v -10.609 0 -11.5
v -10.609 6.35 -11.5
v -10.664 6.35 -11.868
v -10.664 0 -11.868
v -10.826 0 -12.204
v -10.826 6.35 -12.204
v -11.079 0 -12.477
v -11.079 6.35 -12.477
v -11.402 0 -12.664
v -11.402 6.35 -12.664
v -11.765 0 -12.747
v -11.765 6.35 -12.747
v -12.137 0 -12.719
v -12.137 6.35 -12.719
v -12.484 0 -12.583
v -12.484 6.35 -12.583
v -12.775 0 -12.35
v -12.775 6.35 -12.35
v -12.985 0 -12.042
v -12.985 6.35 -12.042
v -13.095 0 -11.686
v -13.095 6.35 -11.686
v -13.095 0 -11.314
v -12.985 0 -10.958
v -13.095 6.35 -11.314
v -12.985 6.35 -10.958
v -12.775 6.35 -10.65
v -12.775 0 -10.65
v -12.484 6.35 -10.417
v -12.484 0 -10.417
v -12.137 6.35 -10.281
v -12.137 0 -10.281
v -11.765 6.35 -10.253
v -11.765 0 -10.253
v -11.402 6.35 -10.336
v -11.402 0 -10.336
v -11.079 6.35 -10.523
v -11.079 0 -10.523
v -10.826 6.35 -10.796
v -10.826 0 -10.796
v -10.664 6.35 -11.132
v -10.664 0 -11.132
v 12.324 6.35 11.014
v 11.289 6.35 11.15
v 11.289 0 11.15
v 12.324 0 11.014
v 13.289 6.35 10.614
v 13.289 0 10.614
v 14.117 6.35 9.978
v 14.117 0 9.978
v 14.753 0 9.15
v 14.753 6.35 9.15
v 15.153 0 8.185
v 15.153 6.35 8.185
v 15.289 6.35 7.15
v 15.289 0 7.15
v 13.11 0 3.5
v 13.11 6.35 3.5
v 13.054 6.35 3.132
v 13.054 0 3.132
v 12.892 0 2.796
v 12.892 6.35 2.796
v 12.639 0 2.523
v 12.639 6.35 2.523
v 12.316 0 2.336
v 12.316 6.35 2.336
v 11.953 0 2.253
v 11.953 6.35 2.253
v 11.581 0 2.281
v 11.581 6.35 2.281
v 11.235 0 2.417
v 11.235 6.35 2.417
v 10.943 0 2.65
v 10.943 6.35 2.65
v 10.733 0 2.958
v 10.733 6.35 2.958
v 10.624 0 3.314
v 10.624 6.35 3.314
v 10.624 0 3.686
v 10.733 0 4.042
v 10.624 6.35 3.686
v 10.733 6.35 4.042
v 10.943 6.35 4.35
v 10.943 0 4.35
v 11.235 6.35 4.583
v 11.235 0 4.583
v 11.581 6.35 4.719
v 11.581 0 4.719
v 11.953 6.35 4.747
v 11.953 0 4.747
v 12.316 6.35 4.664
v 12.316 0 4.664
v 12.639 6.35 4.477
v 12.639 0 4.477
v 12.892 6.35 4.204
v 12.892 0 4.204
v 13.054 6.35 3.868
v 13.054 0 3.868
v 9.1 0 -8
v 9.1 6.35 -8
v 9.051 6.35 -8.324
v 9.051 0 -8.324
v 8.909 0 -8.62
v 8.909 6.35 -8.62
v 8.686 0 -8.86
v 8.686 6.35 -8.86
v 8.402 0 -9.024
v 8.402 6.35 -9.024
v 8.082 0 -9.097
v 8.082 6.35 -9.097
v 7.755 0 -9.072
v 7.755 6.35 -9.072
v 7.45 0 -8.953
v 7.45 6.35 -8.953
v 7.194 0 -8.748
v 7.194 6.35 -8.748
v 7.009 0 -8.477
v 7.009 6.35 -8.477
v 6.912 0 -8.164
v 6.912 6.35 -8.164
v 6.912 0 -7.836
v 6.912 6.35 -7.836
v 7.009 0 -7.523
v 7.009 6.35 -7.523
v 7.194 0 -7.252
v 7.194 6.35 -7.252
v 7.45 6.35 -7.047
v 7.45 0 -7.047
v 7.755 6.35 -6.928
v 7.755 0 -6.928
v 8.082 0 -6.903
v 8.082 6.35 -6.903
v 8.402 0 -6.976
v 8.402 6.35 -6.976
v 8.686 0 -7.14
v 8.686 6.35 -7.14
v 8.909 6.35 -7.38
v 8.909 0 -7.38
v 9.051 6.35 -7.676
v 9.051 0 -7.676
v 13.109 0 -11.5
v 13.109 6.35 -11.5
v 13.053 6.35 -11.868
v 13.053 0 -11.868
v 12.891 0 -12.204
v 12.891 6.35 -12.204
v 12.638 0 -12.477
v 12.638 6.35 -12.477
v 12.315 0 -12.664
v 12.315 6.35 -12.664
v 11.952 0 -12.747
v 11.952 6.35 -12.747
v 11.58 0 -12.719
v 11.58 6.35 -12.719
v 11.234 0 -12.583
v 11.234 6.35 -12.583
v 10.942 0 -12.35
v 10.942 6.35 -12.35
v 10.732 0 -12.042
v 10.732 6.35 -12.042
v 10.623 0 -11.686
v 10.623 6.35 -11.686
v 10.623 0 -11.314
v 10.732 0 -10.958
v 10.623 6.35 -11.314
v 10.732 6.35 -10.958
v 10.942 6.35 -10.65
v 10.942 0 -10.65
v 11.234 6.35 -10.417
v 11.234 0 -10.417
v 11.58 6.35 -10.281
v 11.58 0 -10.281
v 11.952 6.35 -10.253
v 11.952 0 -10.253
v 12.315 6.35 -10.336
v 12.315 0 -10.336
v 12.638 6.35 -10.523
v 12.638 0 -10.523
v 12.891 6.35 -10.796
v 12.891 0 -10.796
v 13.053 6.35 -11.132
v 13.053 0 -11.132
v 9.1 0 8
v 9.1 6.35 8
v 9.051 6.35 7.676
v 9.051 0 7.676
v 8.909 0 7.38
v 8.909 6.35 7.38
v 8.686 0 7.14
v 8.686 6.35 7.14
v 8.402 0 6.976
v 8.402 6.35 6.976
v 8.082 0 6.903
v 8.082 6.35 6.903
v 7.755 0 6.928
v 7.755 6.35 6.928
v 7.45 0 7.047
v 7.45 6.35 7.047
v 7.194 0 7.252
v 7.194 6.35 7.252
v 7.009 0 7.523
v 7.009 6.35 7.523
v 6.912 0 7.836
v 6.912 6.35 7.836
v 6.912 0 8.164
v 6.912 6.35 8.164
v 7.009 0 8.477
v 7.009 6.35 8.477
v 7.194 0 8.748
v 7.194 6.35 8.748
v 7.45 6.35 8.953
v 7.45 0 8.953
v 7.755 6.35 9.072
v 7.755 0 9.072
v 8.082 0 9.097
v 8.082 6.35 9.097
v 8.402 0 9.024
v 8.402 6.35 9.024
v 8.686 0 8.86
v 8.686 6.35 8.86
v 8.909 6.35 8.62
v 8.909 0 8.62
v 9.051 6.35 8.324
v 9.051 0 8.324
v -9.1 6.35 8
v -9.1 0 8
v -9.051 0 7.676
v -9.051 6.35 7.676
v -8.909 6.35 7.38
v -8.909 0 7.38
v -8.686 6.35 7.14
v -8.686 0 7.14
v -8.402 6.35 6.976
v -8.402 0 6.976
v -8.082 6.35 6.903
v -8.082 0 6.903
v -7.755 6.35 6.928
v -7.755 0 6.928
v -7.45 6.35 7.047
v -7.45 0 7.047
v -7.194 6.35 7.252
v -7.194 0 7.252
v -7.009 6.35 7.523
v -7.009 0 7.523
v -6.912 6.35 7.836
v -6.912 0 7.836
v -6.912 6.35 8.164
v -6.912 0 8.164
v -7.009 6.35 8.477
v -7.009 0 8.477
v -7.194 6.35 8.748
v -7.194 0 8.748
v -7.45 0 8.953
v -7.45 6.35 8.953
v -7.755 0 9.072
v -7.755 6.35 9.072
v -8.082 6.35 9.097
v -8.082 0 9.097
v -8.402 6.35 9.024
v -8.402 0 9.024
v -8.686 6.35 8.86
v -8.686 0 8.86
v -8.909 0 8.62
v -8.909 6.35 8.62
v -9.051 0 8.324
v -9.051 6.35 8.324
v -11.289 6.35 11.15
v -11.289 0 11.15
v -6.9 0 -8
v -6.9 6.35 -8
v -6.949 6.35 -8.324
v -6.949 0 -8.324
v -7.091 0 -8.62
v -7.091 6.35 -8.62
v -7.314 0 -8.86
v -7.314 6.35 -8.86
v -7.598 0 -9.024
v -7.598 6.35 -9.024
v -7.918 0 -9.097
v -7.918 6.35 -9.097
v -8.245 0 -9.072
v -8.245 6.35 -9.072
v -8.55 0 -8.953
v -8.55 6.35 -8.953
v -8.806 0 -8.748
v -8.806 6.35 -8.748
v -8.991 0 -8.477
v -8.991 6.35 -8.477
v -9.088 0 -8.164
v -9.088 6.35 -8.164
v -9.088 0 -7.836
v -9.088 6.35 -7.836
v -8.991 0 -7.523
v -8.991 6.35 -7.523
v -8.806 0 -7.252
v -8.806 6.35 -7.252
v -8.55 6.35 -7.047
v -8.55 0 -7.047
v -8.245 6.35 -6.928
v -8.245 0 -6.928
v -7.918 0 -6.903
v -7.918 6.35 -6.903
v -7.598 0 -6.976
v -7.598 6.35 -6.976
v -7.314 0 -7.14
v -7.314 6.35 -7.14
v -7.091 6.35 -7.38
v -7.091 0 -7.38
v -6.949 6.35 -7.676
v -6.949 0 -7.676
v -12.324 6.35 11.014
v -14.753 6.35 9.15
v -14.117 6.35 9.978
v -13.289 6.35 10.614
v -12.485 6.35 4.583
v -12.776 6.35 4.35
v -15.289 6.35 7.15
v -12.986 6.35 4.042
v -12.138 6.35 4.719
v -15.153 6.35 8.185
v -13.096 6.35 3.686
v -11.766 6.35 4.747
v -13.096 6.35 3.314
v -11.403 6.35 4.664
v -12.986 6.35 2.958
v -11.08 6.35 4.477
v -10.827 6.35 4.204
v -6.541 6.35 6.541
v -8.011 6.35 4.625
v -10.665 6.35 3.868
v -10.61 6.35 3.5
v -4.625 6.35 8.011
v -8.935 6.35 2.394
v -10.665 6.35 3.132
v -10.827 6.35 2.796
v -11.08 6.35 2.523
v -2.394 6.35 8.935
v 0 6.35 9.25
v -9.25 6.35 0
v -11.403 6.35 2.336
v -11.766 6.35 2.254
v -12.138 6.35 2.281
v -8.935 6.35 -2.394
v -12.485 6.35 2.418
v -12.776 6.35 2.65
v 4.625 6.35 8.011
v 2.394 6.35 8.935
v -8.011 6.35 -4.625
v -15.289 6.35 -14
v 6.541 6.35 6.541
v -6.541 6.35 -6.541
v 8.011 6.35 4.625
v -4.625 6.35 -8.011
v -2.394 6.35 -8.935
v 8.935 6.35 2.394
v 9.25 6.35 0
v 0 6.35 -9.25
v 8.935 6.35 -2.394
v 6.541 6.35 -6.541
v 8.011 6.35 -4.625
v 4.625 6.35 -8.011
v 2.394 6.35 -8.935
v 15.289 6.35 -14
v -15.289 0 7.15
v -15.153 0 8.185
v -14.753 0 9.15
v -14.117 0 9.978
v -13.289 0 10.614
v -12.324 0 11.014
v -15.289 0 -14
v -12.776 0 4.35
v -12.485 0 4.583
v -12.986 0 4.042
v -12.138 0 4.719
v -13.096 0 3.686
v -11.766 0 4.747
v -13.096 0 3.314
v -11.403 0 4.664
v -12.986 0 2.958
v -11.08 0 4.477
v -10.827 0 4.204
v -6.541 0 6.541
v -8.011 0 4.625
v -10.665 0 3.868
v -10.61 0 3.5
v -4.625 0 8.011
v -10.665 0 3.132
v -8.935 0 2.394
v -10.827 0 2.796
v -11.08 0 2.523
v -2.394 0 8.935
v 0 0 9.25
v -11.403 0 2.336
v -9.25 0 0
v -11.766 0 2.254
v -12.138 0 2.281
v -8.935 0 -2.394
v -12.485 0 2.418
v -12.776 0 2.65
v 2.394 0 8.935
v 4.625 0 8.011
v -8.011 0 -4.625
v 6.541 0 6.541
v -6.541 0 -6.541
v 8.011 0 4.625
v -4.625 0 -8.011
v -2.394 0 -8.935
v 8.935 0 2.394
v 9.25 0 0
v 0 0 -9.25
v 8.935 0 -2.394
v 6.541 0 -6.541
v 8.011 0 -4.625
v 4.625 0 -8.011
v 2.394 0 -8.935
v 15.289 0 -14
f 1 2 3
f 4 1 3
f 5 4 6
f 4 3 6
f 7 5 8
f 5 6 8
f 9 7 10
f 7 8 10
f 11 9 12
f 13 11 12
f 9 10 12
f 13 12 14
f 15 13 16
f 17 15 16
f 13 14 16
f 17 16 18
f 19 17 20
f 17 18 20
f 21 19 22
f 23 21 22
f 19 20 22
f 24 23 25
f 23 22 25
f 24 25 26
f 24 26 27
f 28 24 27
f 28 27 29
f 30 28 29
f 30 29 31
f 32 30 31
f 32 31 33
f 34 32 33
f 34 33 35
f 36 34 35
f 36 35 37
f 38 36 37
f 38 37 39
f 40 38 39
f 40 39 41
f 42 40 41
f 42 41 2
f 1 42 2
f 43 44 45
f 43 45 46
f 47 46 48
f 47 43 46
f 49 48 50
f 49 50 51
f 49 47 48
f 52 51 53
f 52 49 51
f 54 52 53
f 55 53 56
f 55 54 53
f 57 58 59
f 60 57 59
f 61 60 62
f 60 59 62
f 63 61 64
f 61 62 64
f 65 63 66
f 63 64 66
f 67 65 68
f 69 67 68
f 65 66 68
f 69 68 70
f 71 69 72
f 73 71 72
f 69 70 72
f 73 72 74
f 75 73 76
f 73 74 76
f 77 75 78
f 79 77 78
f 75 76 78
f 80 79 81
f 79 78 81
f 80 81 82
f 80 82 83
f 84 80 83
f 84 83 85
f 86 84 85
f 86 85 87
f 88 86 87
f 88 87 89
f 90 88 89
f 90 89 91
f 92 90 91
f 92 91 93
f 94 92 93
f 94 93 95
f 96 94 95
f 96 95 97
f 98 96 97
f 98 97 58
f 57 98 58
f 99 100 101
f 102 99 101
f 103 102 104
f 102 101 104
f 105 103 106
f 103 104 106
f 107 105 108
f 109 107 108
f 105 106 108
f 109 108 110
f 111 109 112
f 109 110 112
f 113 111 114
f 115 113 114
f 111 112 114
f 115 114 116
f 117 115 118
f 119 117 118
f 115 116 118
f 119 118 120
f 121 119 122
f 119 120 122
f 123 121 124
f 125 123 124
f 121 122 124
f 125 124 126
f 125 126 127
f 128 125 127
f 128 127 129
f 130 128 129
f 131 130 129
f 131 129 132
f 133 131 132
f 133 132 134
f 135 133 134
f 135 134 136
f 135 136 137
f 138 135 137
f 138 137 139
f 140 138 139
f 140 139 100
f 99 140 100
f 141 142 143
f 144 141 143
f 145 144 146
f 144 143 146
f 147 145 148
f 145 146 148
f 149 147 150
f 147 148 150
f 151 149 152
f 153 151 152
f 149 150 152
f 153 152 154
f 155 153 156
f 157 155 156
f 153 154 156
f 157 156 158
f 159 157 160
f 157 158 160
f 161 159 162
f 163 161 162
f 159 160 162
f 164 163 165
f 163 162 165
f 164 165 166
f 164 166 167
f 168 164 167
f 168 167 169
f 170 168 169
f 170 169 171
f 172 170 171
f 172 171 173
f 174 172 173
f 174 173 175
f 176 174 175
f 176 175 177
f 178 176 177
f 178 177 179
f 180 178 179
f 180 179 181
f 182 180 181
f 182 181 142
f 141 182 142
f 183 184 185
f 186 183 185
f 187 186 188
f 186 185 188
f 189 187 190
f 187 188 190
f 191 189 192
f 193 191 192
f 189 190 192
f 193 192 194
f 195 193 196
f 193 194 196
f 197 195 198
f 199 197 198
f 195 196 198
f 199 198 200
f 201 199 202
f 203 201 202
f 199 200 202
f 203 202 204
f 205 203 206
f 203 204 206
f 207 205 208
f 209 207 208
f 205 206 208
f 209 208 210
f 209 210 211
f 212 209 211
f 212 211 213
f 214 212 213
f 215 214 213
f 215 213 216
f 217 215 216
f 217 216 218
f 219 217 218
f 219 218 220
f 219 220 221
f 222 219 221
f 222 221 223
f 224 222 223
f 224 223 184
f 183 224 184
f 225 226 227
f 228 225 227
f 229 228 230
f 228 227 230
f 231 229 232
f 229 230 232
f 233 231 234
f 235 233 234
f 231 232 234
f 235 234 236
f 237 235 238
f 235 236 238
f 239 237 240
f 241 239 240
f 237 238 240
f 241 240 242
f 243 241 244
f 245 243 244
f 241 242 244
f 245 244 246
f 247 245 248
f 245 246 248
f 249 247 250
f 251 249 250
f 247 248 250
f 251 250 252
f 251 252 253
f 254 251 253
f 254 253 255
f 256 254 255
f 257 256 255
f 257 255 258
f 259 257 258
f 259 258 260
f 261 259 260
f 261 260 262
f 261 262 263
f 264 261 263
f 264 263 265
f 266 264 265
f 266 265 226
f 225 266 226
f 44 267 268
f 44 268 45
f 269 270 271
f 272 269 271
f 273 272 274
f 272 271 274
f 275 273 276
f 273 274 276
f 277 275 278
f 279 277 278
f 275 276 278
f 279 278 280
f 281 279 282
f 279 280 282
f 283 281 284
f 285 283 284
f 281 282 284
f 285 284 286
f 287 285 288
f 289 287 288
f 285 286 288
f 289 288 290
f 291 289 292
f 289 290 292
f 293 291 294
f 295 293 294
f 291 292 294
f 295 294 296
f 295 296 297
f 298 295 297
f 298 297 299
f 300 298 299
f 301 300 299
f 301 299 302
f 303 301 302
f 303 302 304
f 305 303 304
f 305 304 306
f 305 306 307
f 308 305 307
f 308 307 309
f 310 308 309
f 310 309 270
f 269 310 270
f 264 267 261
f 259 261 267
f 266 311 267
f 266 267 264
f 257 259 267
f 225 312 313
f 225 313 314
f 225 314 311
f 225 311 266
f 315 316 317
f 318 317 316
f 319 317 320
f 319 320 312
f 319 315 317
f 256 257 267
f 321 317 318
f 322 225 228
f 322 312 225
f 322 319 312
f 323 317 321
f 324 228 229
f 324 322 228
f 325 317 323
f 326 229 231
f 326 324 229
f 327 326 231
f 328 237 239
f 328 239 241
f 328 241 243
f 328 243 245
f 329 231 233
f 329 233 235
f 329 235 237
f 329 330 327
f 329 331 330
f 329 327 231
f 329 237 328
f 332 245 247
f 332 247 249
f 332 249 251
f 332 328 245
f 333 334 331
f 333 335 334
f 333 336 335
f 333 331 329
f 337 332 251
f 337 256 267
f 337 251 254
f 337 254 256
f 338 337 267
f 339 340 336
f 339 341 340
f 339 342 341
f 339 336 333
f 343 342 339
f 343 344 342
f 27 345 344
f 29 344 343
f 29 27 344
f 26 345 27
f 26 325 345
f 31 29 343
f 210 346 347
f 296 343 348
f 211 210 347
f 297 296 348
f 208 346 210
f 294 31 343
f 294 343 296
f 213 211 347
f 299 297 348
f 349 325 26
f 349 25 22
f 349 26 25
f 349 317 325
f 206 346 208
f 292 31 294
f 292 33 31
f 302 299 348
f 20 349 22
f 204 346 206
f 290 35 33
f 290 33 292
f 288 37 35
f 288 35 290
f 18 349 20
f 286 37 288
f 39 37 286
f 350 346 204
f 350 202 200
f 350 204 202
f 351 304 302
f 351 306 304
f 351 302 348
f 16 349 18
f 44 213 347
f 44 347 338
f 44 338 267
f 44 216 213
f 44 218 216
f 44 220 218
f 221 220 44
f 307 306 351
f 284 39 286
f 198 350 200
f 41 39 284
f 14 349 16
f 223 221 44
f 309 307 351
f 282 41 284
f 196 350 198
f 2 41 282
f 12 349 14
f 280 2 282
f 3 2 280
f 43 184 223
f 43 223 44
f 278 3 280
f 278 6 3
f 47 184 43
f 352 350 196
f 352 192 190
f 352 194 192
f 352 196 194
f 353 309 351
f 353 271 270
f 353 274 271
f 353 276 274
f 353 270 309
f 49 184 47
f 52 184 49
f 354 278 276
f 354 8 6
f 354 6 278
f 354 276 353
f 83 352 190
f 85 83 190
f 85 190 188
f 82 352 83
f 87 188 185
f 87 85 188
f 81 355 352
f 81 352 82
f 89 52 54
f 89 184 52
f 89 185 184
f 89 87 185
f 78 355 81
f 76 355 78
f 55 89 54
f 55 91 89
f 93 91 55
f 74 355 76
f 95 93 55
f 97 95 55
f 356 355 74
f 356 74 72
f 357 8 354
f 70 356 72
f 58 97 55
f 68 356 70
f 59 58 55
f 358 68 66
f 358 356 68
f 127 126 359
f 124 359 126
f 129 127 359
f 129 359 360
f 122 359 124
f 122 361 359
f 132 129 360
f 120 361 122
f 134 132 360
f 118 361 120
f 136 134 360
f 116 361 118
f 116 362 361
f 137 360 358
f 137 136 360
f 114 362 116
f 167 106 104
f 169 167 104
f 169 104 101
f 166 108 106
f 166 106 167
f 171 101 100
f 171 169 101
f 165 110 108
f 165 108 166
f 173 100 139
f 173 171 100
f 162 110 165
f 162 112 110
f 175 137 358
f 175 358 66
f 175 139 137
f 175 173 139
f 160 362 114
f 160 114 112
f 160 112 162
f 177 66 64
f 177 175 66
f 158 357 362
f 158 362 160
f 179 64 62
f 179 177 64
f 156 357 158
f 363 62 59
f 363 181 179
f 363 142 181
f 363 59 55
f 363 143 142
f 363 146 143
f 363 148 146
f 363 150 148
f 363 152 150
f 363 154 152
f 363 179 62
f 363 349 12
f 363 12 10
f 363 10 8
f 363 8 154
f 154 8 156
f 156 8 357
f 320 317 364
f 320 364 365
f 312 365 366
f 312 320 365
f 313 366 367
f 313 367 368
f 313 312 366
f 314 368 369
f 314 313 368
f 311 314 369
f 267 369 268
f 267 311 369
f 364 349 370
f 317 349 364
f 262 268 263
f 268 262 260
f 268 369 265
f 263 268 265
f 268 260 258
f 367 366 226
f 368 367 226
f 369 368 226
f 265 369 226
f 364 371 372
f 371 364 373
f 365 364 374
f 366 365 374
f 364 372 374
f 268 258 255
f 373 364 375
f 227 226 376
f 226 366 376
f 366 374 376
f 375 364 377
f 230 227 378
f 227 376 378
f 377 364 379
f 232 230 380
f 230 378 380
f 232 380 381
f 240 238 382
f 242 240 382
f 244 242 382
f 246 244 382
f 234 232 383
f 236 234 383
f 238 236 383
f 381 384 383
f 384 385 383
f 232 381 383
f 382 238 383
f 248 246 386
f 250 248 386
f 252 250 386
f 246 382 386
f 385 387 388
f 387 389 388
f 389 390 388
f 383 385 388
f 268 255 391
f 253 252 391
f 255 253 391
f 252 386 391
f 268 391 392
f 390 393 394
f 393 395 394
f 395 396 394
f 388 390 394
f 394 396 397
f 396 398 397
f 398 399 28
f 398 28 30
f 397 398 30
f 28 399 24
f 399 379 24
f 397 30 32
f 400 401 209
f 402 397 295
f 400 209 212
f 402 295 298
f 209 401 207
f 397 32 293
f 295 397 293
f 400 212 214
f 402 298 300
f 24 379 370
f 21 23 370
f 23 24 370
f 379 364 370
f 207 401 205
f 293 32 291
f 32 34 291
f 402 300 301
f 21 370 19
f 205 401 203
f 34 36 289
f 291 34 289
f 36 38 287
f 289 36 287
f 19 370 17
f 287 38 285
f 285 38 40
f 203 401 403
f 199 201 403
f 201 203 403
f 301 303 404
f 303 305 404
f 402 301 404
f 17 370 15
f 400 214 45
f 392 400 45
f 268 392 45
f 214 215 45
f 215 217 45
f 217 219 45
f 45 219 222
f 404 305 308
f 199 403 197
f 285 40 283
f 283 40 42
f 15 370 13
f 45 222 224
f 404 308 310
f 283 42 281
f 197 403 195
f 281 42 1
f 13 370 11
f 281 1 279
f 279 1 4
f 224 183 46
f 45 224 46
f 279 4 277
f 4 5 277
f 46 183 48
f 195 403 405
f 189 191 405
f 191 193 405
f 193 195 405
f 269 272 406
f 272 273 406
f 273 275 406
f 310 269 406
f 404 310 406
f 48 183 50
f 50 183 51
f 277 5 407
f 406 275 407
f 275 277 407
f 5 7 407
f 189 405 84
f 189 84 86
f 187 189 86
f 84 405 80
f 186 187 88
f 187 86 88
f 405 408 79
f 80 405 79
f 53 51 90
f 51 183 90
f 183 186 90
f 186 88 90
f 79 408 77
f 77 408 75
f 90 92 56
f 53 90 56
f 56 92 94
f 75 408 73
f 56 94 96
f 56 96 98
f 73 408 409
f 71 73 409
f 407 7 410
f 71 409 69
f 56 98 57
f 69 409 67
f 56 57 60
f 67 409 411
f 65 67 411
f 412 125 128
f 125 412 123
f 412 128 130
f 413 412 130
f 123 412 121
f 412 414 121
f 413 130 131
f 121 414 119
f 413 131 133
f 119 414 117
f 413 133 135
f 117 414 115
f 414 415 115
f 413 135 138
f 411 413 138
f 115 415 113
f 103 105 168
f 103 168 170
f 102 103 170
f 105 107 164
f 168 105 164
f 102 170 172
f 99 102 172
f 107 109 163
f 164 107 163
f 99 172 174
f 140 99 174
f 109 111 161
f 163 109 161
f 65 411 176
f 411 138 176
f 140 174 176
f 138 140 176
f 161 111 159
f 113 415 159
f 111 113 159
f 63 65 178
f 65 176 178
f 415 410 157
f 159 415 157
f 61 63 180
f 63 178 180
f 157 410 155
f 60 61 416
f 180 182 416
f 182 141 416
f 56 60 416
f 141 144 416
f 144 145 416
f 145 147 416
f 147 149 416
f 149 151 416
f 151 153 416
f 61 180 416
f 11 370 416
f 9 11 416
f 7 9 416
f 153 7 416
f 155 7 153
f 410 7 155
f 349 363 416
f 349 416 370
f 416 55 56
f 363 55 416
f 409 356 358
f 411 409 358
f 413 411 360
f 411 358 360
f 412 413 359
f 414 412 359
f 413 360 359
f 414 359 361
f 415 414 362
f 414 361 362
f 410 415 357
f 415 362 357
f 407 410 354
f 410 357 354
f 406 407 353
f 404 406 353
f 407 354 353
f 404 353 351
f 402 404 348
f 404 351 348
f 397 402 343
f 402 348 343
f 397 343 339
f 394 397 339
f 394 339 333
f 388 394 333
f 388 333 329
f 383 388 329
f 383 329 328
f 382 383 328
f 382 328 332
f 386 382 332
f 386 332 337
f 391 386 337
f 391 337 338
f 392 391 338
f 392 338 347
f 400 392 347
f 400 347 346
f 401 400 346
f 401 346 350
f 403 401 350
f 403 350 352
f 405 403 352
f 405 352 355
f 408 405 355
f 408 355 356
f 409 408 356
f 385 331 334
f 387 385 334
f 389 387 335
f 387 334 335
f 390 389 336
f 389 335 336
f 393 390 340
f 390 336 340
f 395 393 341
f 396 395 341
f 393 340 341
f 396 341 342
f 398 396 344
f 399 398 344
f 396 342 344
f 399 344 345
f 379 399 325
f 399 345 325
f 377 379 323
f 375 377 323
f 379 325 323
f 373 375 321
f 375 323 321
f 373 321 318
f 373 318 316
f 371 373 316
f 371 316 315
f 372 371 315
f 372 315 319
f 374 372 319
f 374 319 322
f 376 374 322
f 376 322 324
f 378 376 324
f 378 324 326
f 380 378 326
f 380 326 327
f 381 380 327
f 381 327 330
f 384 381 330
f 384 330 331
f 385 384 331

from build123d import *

# Parameters (mm, degrees)
BOSS_EXTRUDE1_DEPTH              = 6.35
F_2_2_2_2_DIAMETER_HOLE1_D       = 2.2
F_2_2_2_2_DIAMETER_HOLE1_DEPTH   = 6.35
F_2_2_2_2_DIAMETER_HOLE2_D       = 2.2
F_2_2_2_2_DIAMETER_HOLE2_DEPTH   = 6.35
F_2_2_2_2_DIAMETER_HOLE3_D       = 2.2
F_2_2_2_2_DIAMETER_HOLE3_DEPTH   = 6.35
F_2_2_2_2_DIAMETER_HOLE4_D       = 2.2
F_2_2_2_2_DIAMETER_HOLE4_DEPTH   = 6.35
F_18_5_18_5_DIAMETER_HOLE1_D     = 18.5
F_18_5_18_5_DIAMETER_HOLE1_DEPTH = 6.35
M3_TAPPED_HOLE1_D                = 2.5
M3_TAPPED_HOLE2_D                = 2.5
M3_TAPPED_HOLE3_D                = 2.5
M3_TAPPED_HOLE4_D                = 2.5


with BuildPart() as part:
    # Sketch1 → Boss-Extrude1 (new body)
    with BuildSketch(Plane(origin=(0, 6.35, 0), x_dir=(1, 0, 0), z_dir=(0, 1, 0))):
        with BuildLine():
            Line((15.288980095, -7.15), (15.288980095, 14))
            Line((15.288980095, 14), (-15.289019905, 14))
            Line((-15.289019905, 14), (-15.289019905, -7.15))
            ThreePointArc((-15.289019905, -7.15), (-14.11744703, -9.978427125), (-11.289019905, -11.15))
            Line((-11.289019905, -11.15), (11.288980095, -11.15))
            ThreePointArc((11.288980095, -11.15), (14.11740722, -9.978427125), (15.288980095, -7.15))
        make_face()
    extrude(amount=-BOSS_EXTRUDE1_DEPTH)

    # Ø2.2 (2.2) Diameter Hole1
    with Locations(Plane(origin=(0, 0, 0), x_dir=(-1, 0, 0), z_dir=(0, -1, 0))):
        with Locations((-7.999980095, -8)):
            Hole(F_2_2_2_2_DIAMETER_HOLE1_D / 2, depth=F_2_2_2_2_DIAMETER_HOLE1_DEPTH)

    # Ø2.2 (2.2) Diameter Hole2
    with Locations(Plane(origin=(0, 0, 0), x_dir=(-1, 0, 0), z_dir=(0, -1, 0))):
        with Locations((8.000019905, 8)):
            Hole(F_2_2_2_2_DIAMETER_HOLE2_D / 2, depth=F_2_2_2_2_DIAMETER_HOLE2_DEPTH)

    # Ø2.2 (2.2) Diameter Hole3
    with Locations(Plane(origin=(0, 0, 0), x_dir=(-1, 0, 0), z_dir=(0, -1, 0))):
        with Locations((-7.999980095, 8)):
            Hole(F_2_2_2_2_DIAMETER_HOLE3_D / 2, depth=F_2_2_2_2_DIAMETER_HOLE3_DEPTH)

    # Ø2.2 (2.2) Diameter Hole4
    with Locations(Plane(origin=(0, 6.35, 0), x_dir=(1, 0, 0), z_dir=(0, 1, 0))):
        with Locations((-8.000019905, -8)):
            Hole(F_2_2_2_2_DIAMETER_HOLE4_D / 2, depth=F_2_2_2_2_DIAMETER_HOLE4_DEPTH)

    # Ø18.5 (18.5) Diameter Hole1
    with Locations(Plane(origin=(0, 0, 0), x_dir=(-1, 0, 0), z_dir=(0, -1, 0))):
        with Locations((0, 0)):
            Hole(F_18_5_18_5_DIAMETER_HOLE1_D / 2, depth=F_18_5_18_5_DIAMETER_HOLE1_DEPTH)

    # M3 Tapped Hole1 (through all)
    with Locations(Plane(origin=(0, 0, 0), x_dir=(-1, 0, 0), z_dir=(0, -1, 0))):
        with Locations((11.858637076, 11.5)):
            Hole(M3_TAPPED_HOLE1_D / 2)

    # M3 Tapped Hole2 (through all)
    with Locations(Plane(origin=(0, 0, 0), x_dir=(-1, 0, 0), z_dir=(0, -1, 0))):
        with Locations((11.85956559, -3.500033723)):
            Hole(M3_TAPPED_HOLE2_D / 2)

    # M3 Tapped Hole3 (through all)
    with Locations(Plane(origin=(0, 0, 0), x_dir=(-1, 0, 0), z_dir=(0, -1, 0))):
        with Locations((-11.858647005, 11.5)):
            Hole(M3_TAPPED_HOLE3_D / 2)

    # M3 Tapped Hole4 (through all)
    with Locations(Plane(origin=(0, 0, 0), x_dir=(-1, 0, 0), z_dir=(0, -1, 0))):
        with Locations((-11.859575542, -3.5)):
            Hole(M3_TAPPED_HOLE4_D / 2)


solid = part.part
